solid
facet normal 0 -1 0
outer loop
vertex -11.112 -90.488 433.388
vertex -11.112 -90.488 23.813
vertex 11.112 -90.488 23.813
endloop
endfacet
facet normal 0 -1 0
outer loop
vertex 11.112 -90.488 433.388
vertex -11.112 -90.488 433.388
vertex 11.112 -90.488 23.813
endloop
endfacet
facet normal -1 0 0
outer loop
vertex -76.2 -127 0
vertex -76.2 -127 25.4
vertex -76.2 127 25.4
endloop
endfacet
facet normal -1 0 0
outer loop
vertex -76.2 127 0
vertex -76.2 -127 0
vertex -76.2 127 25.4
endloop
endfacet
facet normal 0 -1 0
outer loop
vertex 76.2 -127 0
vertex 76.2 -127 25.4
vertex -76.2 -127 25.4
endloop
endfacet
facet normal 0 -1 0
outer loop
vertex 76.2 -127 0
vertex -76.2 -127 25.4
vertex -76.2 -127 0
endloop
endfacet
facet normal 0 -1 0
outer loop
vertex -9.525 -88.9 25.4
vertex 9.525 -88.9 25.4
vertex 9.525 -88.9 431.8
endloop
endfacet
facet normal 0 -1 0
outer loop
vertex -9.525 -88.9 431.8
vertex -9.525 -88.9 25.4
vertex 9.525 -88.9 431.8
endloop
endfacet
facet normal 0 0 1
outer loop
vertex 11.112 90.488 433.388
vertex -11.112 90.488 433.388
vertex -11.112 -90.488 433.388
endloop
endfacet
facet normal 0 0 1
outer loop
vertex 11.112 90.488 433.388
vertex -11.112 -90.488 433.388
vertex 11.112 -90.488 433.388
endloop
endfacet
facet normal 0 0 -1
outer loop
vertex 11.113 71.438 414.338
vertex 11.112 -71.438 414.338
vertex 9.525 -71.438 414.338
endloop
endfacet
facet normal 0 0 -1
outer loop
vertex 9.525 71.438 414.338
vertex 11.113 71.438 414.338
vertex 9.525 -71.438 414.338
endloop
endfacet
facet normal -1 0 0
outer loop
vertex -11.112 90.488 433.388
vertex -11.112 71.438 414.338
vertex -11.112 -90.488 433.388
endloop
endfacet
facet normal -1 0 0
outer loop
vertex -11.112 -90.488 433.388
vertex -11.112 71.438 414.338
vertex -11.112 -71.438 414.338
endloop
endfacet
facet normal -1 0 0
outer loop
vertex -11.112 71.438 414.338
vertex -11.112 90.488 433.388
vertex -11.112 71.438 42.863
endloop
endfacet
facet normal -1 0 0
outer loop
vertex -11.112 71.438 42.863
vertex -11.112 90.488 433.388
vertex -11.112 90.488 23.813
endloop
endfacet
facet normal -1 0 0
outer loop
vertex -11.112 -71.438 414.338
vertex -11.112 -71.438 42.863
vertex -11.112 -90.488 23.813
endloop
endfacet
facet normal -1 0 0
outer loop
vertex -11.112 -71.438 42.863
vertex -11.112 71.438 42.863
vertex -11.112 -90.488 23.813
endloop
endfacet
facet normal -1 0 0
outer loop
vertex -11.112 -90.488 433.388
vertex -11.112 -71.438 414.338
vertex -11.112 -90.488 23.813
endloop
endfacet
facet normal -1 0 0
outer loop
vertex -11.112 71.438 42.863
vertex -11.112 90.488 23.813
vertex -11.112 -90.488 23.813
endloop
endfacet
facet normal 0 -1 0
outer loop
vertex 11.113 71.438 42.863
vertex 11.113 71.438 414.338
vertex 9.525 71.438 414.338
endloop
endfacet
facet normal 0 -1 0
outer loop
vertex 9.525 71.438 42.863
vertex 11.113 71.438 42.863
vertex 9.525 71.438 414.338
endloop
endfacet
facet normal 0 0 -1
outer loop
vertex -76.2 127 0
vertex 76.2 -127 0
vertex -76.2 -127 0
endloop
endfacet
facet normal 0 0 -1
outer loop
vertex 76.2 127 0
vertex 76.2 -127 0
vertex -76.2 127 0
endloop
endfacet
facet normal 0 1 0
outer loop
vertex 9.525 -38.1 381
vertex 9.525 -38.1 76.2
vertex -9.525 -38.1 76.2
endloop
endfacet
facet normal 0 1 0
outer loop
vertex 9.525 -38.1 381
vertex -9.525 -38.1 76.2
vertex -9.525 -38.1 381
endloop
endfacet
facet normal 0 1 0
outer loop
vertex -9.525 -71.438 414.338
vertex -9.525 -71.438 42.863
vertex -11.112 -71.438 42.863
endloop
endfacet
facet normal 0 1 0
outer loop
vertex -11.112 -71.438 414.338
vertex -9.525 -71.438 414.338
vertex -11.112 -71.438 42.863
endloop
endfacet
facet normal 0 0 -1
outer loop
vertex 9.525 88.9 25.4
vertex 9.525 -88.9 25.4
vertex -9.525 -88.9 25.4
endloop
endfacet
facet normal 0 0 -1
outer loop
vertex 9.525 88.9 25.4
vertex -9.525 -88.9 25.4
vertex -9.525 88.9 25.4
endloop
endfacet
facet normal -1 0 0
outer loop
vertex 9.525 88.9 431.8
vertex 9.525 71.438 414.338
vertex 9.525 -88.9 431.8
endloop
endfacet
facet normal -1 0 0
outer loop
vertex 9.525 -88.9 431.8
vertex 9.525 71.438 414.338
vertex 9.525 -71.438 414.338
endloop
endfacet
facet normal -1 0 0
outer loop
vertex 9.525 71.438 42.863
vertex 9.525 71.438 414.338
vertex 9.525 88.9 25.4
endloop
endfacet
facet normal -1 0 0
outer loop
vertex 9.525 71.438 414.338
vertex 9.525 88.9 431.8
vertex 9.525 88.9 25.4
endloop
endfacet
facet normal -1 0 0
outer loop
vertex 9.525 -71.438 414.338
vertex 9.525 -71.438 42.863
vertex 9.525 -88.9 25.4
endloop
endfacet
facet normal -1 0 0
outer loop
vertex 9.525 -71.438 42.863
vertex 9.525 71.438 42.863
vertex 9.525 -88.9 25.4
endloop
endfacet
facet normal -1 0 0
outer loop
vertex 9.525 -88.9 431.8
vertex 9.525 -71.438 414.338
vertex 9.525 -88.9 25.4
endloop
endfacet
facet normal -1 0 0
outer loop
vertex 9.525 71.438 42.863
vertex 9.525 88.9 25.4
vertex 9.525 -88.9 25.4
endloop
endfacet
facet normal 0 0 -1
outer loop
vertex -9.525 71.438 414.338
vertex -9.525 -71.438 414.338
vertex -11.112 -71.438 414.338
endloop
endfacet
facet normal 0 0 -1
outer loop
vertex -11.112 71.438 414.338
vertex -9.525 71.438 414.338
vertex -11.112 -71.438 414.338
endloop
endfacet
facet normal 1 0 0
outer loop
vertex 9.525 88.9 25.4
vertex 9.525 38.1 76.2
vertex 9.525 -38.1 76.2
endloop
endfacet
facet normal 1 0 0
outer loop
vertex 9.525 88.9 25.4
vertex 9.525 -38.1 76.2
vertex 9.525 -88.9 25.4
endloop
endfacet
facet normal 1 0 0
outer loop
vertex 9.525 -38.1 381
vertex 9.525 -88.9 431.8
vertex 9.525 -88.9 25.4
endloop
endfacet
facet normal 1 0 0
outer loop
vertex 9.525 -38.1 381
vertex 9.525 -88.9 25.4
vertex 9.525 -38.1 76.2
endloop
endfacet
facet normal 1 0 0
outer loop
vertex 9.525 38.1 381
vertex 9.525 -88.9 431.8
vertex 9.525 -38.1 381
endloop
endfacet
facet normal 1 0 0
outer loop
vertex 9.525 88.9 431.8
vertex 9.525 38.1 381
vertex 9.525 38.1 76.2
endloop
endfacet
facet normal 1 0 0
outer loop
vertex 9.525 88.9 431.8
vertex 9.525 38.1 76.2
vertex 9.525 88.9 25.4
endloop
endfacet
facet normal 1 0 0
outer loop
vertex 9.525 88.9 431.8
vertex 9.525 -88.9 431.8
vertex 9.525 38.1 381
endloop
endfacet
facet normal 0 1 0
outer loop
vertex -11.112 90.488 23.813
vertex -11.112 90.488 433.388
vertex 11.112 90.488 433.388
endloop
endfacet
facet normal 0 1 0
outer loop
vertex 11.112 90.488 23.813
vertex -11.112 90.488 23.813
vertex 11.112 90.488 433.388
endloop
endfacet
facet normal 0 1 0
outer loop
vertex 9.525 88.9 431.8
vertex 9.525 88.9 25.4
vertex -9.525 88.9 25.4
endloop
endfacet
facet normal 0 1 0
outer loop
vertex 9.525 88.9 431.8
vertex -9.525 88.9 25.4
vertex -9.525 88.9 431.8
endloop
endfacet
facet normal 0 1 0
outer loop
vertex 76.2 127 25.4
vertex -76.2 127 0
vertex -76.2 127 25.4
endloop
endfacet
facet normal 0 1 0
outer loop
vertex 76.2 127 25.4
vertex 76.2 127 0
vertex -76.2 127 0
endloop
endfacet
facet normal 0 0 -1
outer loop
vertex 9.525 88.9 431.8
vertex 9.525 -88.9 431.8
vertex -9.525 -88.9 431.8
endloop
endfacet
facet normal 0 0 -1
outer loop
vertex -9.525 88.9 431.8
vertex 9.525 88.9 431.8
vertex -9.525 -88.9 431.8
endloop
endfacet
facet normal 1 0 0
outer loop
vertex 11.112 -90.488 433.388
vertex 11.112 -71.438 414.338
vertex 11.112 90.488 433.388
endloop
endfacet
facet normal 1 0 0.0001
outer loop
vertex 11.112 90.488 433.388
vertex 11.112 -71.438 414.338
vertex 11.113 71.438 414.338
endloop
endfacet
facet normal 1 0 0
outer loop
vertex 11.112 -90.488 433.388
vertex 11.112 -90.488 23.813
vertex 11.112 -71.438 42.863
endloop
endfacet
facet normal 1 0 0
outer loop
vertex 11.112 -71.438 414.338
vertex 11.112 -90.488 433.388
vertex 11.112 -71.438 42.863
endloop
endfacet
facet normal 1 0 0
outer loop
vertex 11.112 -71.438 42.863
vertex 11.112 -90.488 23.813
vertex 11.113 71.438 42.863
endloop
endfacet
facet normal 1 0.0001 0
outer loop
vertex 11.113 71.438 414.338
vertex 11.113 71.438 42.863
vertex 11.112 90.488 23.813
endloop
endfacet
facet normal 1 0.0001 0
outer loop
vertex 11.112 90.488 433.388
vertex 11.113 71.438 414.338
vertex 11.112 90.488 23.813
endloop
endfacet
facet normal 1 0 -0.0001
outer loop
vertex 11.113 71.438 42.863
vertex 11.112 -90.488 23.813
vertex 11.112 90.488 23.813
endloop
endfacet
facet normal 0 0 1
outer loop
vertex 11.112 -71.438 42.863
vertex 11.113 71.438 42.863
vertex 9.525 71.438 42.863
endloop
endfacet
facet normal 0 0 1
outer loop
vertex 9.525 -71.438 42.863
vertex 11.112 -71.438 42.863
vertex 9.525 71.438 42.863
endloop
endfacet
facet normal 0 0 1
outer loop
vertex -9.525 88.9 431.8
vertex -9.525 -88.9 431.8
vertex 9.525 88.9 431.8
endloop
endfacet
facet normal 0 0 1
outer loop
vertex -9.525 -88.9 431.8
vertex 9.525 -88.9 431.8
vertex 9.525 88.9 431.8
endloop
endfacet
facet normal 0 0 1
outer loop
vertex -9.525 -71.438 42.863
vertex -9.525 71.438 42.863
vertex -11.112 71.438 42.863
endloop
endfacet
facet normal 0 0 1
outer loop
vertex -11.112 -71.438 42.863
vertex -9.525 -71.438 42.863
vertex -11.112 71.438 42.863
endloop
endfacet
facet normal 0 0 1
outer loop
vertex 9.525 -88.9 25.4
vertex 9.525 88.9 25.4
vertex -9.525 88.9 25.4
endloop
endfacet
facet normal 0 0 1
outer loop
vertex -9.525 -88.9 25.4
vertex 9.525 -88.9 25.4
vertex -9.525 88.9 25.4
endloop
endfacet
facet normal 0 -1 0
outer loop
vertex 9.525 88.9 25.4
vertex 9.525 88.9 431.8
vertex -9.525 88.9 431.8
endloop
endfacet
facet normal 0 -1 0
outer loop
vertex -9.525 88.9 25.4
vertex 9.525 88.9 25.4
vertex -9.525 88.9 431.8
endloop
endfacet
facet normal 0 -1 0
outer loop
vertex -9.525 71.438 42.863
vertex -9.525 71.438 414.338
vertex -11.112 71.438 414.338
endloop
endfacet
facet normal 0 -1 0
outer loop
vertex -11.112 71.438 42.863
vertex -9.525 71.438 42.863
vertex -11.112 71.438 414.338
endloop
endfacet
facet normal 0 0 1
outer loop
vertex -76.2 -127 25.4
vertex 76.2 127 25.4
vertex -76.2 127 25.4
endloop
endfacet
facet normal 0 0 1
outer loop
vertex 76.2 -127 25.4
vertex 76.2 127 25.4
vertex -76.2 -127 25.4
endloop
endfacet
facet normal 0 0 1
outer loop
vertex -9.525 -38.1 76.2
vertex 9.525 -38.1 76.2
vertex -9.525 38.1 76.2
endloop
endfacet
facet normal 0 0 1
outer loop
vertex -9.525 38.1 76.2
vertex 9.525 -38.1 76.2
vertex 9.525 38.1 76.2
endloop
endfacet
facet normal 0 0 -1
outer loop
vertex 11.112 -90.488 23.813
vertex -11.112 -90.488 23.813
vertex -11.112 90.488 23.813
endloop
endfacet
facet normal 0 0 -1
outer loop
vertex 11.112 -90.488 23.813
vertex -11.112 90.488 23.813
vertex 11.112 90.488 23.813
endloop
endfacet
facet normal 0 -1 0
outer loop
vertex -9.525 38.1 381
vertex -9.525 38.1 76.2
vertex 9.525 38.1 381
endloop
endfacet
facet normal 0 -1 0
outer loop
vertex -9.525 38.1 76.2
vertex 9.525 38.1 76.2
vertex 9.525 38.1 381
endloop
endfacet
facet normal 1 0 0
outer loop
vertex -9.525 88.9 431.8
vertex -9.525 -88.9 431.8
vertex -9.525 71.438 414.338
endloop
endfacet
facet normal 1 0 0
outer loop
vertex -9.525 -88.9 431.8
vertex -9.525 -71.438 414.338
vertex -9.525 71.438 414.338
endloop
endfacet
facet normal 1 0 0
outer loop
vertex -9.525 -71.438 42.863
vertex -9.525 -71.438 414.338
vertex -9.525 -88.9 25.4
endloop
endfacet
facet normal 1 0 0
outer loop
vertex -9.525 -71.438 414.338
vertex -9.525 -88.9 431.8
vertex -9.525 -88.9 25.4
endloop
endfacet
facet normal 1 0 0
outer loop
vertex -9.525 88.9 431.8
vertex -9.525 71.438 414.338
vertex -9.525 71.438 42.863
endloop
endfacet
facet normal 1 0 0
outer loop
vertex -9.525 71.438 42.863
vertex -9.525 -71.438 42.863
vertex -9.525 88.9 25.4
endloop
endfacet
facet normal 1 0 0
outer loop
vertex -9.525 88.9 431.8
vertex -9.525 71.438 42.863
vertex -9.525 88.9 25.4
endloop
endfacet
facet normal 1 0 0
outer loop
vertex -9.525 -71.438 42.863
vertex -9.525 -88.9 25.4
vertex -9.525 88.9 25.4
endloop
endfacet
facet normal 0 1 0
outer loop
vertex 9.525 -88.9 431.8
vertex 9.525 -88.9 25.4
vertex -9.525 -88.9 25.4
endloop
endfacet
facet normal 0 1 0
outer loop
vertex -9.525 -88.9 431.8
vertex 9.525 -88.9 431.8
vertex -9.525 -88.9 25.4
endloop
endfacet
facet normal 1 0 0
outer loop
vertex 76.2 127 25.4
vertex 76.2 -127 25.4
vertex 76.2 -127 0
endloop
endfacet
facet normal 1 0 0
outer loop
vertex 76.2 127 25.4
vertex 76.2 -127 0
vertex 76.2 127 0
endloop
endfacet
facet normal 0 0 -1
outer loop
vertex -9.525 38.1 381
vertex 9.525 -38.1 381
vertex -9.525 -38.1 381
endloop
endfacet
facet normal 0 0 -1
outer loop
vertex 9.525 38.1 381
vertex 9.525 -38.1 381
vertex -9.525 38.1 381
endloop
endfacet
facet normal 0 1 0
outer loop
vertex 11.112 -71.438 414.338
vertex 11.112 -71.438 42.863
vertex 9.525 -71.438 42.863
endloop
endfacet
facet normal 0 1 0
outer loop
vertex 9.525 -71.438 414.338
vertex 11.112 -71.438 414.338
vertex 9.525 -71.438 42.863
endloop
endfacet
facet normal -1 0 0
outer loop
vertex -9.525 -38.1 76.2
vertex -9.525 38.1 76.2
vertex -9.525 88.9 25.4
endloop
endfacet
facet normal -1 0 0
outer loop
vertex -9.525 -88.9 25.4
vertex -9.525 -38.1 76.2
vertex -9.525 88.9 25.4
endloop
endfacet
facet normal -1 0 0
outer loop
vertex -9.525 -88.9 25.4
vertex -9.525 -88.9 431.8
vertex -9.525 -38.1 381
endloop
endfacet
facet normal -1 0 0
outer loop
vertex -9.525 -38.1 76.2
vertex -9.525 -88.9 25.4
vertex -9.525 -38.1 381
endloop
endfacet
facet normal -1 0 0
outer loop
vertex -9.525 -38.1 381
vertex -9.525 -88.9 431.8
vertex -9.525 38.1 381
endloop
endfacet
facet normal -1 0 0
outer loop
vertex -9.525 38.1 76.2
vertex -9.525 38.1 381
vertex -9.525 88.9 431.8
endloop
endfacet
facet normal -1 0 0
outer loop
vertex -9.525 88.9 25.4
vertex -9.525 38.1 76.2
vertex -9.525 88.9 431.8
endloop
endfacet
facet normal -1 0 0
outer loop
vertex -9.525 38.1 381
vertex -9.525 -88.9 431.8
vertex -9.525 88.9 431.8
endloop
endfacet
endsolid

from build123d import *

# Parameters (mm, degrees)
F0_W     = 177.8
F0_H     = 406.4
F0_W_2   = 76.2
F0_H_2   = 304.8
F1_DEPTH = 9.525
F2_DEPTH = 76.2


with BuildPart() as f1:
    # F0 (on Right) → F1 (new body, symmetric)
    with BuildSketch(Plane.YZ):
        with Locations((0, 228.6)):
            Rectangle(F0_W, F0_H)
        with Locations((0, 228.6)):
            Rectangle(F0_W_2, F0_H_2, mode=Mode.SUBTRACT)
    extrude(amount=F1_DEPTH, both=True)


with BuildPart() as f2:
    # F0 (on Right) → F2 (new body, symmetric)
    with BuildSketch(Plane.YZ):
        Polygon((127, 25.4), (88.9, 25.4), (-88.9, 25.4), (-127, 25.4), (-127, 0), (127, 0), align=None)
    extrude(amount=F2_DEPTH, both=True)


with BuildPart() as f4:
    # F4: sweep along a path in F4_path
    with BuildLine(Plane(origin=(9.525, -88.9, 431.8), x_dir=(0, 0, -1), z_dir=(-1, 0, 0))) as f4_path:
        Line((0, 0), (406.4, 0))
        Line((406.4, 0), (406.4, -177.8))
        Line((406.4, -177.8), (0, -177.8))
        Line((0, -177.8), (0, 0))
    # F3 (on face) → F4 (sweep)
    with BuildSketch(Plane.XY.offset(25.4)):
        Polygon((9.525, -88.9), (-9.525, -88.9), (-9.525, -71.4375), (-11.1125, -71.4375), (-11.1125, -90.4875), (11.1125, -90.4875), (11.1125, -71.4375), (9.525, -71.4375), align=None)
    sweep(path=f4_path.line, transition=Transition.RIGHT)


solid = Compound([f1.part, f2.part, f4.part])
